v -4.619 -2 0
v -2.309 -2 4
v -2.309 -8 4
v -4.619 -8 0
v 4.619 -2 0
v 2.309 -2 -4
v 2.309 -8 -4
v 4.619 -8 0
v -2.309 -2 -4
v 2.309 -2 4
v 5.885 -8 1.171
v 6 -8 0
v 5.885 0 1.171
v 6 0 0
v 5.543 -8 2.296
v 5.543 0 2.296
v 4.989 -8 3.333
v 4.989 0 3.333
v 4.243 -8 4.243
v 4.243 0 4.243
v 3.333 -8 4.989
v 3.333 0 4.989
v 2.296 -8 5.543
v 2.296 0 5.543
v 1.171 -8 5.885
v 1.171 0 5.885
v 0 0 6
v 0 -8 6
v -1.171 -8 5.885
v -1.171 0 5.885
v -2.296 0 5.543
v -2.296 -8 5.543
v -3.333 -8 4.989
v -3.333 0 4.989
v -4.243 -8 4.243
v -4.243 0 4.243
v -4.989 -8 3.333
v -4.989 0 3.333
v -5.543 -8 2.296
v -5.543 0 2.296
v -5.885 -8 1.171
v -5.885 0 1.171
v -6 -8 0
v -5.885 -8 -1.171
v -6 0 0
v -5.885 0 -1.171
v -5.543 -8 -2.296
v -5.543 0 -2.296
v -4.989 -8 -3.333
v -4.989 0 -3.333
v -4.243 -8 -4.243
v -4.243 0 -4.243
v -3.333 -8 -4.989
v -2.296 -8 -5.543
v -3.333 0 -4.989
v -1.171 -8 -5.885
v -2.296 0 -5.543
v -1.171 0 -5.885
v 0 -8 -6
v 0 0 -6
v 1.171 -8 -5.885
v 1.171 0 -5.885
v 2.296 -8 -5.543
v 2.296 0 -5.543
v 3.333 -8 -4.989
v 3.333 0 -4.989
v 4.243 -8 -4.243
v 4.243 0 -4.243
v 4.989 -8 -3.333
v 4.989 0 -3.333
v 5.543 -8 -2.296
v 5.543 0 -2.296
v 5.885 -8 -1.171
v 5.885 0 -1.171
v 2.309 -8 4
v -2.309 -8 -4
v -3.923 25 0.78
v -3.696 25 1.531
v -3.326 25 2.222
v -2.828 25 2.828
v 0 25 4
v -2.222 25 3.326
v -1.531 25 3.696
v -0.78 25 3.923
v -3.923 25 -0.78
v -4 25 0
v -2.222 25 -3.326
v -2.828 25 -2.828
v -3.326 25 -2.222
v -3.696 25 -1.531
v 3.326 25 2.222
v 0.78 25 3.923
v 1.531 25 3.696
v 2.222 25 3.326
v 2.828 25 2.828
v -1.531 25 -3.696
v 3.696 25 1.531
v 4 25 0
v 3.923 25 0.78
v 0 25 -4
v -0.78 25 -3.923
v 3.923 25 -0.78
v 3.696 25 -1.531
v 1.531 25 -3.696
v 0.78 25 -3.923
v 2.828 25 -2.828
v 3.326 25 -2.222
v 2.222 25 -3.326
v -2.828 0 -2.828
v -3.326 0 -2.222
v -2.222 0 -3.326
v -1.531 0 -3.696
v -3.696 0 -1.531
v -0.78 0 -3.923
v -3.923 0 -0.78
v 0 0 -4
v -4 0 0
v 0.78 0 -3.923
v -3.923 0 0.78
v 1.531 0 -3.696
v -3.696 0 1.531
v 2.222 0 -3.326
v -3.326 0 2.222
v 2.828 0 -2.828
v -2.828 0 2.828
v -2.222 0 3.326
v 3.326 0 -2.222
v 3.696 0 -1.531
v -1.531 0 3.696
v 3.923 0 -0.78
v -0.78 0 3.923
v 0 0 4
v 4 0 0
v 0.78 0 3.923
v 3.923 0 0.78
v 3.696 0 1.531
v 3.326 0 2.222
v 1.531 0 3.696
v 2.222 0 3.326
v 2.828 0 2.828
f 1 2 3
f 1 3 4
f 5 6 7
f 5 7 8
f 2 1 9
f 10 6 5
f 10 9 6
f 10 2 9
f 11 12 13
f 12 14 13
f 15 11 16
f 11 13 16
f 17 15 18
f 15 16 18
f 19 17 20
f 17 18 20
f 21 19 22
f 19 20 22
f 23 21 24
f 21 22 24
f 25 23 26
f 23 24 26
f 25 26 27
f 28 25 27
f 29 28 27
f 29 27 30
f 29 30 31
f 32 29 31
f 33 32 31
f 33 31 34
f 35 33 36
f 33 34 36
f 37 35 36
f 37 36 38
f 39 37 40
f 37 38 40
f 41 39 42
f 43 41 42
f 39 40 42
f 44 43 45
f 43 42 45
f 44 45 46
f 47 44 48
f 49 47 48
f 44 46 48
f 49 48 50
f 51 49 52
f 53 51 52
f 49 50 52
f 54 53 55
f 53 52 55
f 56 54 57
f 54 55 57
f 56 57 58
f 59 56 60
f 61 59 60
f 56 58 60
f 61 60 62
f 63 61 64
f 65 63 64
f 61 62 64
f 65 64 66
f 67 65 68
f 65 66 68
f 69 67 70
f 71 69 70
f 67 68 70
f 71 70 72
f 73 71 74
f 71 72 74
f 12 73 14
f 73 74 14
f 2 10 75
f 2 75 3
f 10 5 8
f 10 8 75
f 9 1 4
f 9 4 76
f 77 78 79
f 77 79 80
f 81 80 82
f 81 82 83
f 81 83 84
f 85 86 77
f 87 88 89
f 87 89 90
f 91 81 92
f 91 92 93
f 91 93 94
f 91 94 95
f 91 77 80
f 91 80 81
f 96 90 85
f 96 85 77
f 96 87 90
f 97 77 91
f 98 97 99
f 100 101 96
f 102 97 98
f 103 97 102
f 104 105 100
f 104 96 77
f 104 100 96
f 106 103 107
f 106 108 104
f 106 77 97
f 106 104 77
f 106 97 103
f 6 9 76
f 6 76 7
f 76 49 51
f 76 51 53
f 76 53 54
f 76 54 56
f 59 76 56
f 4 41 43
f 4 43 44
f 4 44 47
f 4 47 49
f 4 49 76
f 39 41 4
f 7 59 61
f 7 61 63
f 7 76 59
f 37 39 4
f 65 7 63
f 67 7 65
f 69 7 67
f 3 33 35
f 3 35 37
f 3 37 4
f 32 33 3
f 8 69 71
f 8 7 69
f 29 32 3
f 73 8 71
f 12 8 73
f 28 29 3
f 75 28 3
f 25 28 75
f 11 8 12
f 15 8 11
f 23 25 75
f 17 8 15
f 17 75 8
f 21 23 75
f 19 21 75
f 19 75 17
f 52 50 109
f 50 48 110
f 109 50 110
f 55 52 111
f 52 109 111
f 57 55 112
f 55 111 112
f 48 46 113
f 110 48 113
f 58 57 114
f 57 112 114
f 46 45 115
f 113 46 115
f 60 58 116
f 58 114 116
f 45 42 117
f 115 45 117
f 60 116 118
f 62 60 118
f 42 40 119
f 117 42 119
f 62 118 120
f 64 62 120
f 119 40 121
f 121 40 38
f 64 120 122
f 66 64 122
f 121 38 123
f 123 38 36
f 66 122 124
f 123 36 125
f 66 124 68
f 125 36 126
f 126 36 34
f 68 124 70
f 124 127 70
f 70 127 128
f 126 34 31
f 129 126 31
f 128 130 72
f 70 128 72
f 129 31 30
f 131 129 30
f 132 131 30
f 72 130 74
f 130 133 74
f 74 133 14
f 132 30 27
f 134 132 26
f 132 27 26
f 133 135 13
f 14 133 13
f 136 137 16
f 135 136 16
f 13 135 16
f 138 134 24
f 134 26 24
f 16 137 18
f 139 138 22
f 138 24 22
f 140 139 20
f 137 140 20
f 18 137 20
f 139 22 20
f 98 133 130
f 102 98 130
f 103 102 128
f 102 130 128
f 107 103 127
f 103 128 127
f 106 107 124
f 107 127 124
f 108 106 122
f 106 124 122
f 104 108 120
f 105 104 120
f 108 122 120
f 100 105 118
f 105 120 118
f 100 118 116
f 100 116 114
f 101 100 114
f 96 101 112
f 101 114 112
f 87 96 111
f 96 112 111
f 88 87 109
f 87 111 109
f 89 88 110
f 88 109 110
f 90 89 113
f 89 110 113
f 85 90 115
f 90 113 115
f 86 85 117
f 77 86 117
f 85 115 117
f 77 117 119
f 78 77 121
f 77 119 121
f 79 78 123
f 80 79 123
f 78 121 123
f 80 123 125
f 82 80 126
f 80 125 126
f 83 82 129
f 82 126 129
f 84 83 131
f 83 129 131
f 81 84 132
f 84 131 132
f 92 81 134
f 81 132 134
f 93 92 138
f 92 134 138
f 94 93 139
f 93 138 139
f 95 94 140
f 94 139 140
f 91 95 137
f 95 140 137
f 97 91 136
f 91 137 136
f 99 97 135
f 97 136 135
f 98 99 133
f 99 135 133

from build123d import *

# Parameters (mm, degrees)
SKETCH1_R           = 4
BOSS_EXTRUDE1_DEPTH = 25
SKETCH2_R           = 6
SKETCH2_R_2         = 4
BOSS_EXTRUDE2_DEPTH = 2
SKETCH3_R           = 6
BOSS_EXTRUDE3_DEPTH = 6


with BuildPart() as part:
    # Sketch1 → Boss-Extrude1 (new body)
    with BuildSketch(Plane(origin=(0, 0, 0), x_dir=(1, 0, 0), z_dir=(0, 1, 0))):
        Circle(SKETCH1_R)
    extrude(amount=BOSS_EXTRUDE1_DEPTH)

    # Sketch2 → Boss-Extrude2 (add)
    with BuildSketch(Plane.XZ):
        Circle(SKETCH2_R)
        Circle(SKETCH2_R_2, mode=Mode.SUBTRACT)
        Circle(SKETCH2_R_2)
        Circle(SKETCH2_R_2)
    extrude(amount=BOSS_EXTRUDE2_DEPTH)

    # Sketch3 → Boss-Extrude3 (add)
    with BuildSketch(Plane.XZ.offset(2)):
        Circle(SKETCH3_R)
        Polygon((4.618802154, 0), (2.309401077, 4), (-2.309401077, 4), (-4.618802154, 0), (-2.309401077, -4), (2.309401077, -4), align=None, mode=Mode.SUBTRACT)
    extrude(amount=BOSS_EXTRUDE3_DEPTH)


solid = part.part
